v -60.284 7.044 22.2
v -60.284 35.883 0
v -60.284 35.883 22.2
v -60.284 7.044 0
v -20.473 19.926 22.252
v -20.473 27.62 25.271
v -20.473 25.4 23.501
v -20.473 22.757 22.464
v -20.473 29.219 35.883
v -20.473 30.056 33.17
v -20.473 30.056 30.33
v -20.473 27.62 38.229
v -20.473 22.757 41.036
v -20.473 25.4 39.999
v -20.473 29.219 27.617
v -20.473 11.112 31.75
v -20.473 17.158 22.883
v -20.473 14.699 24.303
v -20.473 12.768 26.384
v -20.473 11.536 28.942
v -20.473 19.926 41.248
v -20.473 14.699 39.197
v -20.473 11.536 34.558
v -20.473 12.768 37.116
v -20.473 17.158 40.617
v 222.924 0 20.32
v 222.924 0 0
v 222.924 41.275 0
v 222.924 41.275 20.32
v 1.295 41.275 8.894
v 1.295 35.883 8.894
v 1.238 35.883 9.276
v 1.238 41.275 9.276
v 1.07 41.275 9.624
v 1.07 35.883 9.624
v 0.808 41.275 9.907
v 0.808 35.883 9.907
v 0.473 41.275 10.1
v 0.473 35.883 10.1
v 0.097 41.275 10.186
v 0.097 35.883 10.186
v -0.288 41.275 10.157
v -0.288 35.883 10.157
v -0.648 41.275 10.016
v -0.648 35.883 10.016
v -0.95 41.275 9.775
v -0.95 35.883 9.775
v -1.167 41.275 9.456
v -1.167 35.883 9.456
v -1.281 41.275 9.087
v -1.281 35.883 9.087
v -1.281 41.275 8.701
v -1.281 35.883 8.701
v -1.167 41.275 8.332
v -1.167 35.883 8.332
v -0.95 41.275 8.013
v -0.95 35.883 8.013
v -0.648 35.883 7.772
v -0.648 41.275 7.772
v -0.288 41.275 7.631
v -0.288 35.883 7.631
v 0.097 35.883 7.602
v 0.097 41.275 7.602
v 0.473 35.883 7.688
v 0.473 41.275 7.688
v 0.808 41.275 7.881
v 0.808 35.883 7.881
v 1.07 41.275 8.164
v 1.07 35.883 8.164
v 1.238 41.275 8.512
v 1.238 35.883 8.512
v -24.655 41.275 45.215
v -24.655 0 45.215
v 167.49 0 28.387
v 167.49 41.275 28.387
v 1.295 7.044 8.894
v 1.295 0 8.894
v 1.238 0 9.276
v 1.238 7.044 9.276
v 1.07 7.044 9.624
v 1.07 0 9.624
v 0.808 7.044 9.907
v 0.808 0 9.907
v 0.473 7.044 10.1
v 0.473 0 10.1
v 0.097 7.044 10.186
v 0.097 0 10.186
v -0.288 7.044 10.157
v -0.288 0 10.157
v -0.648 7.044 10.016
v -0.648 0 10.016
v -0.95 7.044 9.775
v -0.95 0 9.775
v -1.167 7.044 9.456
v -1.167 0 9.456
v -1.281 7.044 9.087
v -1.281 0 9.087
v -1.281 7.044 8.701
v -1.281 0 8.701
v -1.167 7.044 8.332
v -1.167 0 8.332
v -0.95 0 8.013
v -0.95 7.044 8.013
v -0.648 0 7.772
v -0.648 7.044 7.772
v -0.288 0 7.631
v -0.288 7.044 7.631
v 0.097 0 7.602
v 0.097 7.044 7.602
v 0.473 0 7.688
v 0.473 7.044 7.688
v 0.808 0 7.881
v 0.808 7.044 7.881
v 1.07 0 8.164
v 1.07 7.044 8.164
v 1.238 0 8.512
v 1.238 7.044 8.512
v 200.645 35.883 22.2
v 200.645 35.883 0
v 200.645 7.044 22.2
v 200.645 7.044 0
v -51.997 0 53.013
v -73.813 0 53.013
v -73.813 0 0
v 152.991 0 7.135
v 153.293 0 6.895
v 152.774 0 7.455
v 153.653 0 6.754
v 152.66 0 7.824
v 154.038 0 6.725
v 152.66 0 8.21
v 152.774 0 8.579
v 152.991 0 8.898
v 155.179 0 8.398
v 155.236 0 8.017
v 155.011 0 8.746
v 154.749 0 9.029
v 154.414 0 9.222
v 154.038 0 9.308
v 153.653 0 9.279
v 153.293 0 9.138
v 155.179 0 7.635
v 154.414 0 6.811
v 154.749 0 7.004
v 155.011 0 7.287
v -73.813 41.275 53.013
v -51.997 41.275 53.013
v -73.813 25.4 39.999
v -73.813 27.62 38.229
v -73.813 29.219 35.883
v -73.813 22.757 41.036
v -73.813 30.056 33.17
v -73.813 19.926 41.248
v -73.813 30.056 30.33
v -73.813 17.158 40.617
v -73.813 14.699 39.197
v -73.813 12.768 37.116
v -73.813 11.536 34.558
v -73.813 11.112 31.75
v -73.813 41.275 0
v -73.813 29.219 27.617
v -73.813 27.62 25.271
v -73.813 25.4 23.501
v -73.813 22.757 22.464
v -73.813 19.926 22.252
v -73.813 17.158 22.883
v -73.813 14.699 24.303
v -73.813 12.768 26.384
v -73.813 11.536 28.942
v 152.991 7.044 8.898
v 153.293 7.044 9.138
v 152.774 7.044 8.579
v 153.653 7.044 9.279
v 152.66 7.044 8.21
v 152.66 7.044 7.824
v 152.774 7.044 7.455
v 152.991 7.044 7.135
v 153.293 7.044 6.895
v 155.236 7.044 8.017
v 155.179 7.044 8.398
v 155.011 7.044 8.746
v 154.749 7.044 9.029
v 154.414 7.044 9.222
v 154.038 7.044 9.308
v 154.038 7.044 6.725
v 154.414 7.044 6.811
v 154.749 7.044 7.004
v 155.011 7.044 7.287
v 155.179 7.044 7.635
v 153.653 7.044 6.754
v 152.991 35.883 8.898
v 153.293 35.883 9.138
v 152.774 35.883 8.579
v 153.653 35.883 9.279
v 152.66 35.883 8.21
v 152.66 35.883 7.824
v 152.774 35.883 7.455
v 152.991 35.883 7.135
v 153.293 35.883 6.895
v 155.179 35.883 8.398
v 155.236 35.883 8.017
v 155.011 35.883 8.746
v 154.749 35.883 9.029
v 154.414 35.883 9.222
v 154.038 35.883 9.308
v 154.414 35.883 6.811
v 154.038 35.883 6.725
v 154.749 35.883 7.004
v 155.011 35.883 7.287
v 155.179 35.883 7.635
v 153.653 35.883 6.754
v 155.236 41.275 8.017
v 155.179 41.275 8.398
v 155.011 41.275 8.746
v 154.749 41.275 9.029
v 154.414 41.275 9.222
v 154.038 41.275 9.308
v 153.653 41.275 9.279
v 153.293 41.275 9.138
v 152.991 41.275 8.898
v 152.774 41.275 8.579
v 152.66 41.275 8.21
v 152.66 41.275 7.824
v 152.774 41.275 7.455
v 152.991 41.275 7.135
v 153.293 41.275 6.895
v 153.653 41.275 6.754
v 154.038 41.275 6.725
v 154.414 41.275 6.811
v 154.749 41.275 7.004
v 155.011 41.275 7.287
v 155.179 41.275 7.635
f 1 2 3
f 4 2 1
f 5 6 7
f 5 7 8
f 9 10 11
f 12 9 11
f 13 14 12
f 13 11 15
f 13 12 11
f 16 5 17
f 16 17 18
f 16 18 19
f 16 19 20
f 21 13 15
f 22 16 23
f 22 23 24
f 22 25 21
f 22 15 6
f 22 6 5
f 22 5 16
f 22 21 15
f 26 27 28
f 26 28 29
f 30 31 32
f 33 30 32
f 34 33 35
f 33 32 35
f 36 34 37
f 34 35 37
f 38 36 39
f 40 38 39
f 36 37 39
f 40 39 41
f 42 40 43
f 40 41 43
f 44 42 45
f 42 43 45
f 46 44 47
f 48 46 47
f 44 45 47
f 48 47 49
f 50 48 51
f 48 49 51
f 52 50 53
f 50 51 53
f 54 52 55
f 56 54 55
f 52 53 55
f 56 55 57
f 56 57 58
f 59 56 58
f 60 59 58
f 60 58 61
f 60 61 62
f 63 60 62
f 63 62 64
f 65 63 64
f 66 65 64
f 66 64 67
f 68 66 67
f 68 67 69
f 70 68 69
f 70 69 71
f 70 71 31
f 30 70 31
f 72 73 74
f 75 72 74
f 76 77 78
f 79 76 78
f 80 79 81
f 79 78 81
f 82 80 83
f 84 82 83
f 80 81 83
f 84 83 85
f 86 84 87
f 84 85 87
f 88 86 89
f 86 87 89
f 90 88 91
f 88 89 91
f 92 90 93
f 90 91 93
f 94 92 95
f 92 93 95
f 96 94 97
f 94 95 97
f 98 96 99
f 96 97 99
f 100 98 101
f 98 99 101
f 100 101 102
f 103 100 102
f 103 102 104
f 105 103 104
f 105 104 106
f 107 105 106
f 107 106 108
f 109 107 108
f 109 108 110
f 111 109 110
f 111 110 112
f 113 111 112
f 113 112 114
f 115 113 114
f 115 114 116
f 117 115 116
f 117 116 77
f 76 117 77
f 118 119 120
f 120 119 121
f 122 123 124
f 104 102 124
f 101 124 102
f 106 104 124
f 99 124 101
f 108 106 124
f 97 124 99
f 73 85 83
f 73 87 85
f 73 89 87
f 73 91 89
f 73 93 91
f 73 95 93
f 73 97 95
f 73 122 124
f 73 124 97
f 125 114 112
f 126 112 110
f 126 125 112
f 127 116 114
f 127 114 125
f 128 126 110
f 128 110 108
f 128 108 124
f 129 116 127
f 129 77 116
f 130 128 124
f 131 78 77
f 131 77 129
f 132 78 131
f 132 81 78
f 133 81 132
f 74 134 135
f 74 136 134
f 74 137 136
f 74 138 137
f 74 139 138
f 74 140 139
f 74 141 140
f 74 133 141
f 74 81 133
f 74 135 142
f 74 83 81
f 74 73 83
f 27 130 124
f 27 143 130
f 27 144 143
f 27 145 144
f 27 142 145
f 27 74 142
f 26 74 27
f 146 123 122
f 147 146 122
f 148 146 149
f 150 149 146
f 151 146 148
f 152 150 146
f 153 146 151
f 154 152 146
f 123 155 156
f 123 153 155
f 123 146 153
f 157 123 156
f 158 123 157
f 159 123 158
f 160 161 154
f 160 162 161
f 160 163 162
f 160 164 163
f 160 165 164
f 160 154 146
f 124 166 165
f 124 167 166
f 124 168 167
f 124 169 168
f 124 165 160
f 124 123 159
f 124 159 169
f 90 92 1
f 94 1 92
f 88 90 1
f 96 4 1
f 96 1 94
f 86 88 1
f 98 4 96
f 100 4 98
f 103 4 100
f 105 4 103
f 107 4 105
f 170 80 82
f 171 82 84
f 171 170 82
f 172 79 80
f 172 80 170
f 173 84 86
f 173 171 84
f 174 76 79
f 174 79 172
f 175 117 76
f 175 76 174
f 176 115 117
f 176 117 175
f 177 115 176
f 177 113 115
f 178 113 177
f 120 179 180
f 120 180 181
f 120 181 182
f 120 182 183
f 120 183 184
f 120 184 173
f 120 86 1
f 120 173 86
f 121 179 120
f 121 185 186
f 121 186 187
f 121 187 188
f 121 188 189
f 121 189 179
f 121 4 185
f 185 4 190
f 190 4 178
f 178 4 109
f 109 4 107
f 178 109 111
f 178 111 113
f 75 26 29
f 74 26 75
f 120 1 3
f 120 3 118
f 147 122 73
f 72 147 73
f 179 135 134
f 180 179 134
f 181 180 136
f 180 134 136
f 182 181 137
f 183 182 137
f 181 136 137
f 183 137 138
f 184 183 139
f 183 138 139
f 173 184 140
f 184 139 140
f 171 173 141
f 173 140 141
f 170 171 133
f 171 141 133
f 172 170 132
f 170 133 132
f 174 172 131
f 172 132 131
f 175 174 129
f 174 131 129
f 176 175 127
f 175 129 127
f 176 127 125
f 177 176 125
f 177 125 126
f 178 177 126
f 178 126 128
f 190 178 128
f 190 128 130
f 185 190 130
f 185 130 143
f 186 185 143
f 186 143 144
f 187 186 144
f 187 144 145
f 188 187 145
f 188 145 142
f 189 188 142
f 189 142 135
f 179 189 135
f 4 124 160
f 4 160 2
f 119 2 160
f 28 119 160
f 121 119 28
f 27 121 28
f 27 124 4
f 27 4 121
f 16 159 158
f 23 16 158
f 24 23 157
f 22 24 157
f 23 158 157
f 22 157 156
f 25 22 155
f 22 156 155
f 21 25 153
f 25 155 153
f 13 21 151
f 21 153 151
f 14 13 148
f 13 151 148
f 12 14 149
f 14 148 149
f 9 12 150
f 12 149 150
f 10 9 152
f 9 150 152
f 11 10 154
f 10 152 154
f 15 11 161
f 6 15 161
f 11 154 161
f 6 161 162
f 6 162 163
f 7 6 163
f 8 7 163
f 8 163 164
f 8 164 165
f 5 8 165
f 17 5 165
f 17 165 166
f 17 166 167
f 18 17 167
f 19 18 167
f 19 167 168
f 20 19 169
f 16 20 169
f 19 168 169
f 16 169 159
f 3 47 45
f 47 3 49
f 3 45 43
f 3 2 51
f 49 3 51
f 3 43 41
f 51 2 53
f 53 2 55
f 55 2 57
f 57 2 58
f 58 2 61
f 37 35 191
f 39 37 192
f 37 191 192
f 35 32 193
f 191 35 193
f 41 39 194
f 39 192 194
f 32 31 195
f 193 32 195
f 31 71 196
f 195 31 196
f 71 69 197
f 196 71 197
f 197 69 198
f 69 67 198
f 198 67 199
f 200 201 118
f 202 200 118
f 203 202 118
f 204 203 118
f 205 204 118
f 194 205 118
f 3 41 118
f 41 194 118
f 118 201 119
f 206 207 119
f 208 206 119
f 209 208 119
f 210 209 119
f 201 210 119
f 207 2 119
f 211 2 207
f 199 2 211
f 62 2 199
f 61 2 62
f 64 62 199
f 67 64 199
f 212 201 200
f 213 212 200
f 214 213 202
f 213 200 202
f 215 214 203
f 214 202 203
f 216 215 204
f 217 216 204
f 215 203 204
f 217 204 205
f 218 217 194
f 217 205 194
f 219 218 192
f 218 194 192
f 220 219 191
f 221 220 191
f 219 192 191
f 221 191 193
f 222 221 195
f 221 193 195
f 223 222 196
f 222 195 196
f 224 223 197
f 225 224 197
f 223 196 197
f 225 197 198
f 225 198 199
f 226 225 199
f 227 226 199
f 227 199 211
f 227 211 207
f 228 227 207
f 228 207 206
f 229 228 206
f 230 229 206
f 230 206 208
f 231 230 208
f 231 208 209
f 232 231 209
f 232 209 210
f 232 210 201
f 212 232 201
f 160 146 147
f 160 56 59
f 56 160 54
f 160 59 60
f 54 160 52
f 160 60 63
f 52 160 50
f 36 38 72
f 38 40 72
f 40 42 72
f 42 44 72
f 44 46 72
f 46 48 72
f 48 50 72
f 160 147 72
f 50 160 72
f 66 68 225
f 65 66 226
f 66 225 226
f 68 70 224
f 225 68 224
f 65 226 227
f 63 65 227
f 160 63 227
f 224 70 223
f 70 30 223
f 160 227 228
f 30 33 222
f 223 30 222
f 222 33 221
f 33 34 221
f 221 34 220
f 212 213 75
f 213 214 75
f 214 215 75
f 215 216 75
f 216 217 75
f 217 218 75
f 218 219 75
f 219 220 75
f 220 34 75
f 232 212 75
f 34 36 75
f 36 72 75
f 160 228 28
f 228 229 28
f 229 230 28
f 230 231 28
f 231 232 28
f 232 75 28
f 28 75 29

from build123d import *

# Parameters (mm, degrees)
F1_DEPTH  = 41.275
F2_R      = 9.525
F3_DEPTH  = 53.34
F5_W      = 260.929487
F5_H      = 28.83905
F6_DEPTH  = 22.1996
F8_DEPTH  = 50.8
F9_R      = 1.2954
F10_DEPTH = 101.6
F11_R     = 1.2954
F12_DEPTH = 101.6


with BuildPart() as f1:
    # F0 (on Front) → F1 (new body)
    with BuildSketch(Plane.XZ):
        Polygon((-73.813496, 63.5), (-73.813496, 0), (222.924162, 0), (222.924162, 20.32), align=None)
    extrude(amount=-F1_DEPTH)

    # F2 (on face) → F3 (cut)
    with BuildSketch(Plane(origin=(-73.813496, 0, 0), x_dir=(0, -1, 0), z_dir=(-1, 0, 0))):
        with Locations((-20.6375, 31.75)):
            Circle(F2_R)
    extrude(amount=-F3_DEPTH, mode=Mode.SUBTRACT)

    # F5 (on face) → F6 (cut)
    with BuildSketch(Plane(origin=(0, 0, 0), x_dir=(1, 0, 0), z_dir=(0, 0, -1))):
        with Locations((70.18033, -21.463492)):
            Rectangle(F5_W, F5_H)
    extrude(amount=-F6_DEPTH, mode=Mode.SUBTRACT)

    # F7 (on face) → F8 (cut)
    with BuildSketch(Plane.XZ):
        Polygon((-24.655161, 45.214526), (167.490213, 28.386512), (-73.813496, 63.5), (-73.813496, 53.013064), (-51.996879, 53.013064), align=None)
    extrude(amount=-F8_DEPTH, mode=Mode.SUBTRACT)

    # F9 (on face) → F10 (cut)
    with BuildSketch(Plane.XZ):
        with Locations((0, 8.893992)):
            Circle(F9_R)
    extrude(amount=-F10_DEPTH, mode=Mode.SUBTRACT)

    # F11 (on face) → F12 (cut)
    with BuildSketch(Plane.XZ):
        with Locations((153.94105, 8.016577)):
            Circle(F11_R)
    extrude(amount=-F12_DEPTH, mode=Mode.SUBTRACT)


solid = f1.part
